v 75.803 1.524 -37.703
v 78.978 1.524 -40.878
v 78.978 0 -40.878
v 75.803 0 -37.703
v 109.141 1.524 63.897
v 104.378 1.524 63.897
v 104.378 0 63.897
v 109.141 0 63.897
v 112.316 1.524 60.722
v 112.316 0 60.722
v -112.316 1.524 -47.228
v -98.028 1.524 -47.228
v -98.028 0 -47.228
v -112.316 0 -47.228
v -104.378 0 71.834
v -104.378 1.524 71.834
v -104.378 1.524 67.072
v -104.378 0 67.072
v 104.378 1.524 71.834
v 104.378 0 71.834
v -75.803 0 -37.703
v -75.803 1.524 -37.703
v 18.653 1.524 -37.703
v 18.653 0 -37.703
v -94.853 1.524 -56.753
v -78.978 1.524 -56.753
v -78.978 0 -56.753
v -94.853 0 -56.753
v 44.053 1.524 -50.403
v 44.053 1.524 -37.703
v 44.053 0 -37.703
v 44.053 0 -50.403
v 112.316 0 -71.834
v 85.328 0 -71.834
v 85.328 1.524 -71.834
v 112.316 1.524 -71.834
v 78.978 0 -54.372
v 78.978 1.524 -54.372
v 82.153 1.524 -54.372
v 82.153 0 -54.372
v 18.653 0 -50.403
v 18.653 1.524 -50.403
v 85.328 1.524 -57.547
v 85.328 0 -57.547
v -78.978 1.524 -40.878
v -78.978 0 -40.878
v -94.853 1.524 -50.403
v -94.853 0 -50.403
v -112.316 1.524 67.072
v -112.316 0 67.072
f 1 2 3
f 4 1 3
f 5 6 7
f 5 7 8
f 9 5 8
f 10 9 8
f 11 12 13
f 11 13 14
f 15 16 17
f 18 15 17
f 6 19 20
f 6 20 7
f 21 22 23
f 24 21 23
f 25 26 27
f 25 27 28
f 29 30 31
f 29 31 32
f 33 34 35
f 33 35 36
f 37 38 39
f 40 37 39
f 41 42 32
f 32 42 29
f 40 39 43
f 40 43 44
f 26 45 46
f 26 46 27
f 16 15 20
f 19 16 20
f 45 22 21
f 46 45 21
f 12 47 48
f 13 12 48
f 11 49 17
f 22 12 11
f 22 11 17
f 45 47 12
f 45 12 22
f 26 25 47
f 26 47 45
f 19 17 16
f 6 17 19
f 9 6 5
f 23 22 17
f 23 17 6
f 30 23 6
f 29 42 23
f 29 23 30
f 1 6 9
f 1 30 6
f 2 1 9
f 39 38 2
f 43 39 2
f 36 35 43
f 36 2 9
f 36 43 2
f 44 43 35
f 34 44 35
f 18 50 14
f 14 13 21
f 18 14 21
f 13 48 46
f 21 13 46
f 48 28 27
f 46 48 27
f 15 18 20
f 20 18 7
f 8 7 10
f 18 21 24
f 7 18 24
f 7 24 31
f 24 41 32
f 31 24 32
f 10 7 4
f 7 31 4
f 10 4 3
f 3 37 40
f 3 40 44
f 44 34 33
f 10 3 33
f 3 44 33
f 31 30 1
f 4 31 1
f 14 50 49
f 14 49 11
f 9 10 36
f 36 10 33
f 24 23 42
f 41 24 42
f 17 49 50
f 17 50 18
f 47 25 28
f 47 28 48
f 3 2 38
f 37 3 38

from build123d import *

# Parameters (mm, degrees)
SKETCH1_W           = 224.63125
SKETCH1_H           = 143.66875
BOSS_EXTRUDE1_DEPTH = 1.524
CUT_EXTRUDE1_REACH  = 135.332
SKETCH2_W           = 157.95625
SKETCH2_H           = 34.13125
CHAMFER1_SIZE       = 3.175
SKETCH3_W           = 25.4
SKETCH3_H           = 12.7
BOSS_EXTRUDE2_DEPTH = 1.524
CUT_EXTRUDE2_REACH  = 135.332
CUT_EXTRUDE3_REACH  = 135.332
SKETCH5_W           = 6.35
SKETCH5_H           = 17.4625
CHAMFER2_SIZE       = 3.175
CUT_EXTRUDE4_REACH  = 135.332
SKETCH6_W           = 7.9375
SKETCH6_H           = 4.7625
SKETCH6_H_2         = 7.9375
CHAMFER3_SIZE       = 3.175


with BuildPart() as part:
    # Sketch1 → Boss-Extrude1 (new body)
    with BuildSketch(Plane(origin=(0, 0, 0), x_dir=(1, 0, 0), z_dir=(0, 1, 0))):
        Rectangle(SKETCH1_W, SKETCH1_H)
    extrude(amount=BOSS_EXTRUDE1_DEPTH)

    # Sketch2 → Cut-Extrude1 (cut, up to next)
    with BuildSketch(Plane(origin=(0, 1.524, 0), x_dir=(1, 0, 0), z_dir=(0, 1, 0)), mode=Mode.PRIVATE) as cut_extrude1_sk1:
        with Locations((0, 54.76875)):
            Rectangle(SKETCH2_W, SKETCH2_H)
    cut_extrude1_tool1 = extrude(cut_extrude1_sk1.sketch, amount=-CUT_EXTRUDE1_REACH, mode=Mode.PRIVATE) & part.part
    add(cut_extrude1_tool1.solids().sort_by_distance((0, 1.524, -54.76875))[0], mode=Mode.SUBTRACT)

    # Chamfer1
    chamfer1_edges = [part.edges().sort_by_distance(p)[0] for p in [
        (-78.978125, 0.762, -37.703125),
        (78.978125, 0.762, -37.703125),
    ]]
    chamfer(chamfer1_edges, length=CHAMFER1_SIZE)

    # Sketch3 → Boss-Extrude2 (add)
    with BuildSketch(Plane(origin=(0, 1.524, 0), x_dir=(1, 0, 0), z_dir=(0, 1, 0))):
        with Locations((31.353125, 44.053125)):
            Rectangle(SKETCH3_W, SKETCH3_H)
    extrude(amount=-BOSS_EXTRUDE2_DEPTH)

    # Sketch4 → Cut-Extrude2 (cut, up to next)
    with BuildSketch(Plane(origin=(0, 1.524, 0), x_dir=(1, 0, 0), z_dir=(0, 1, 0)), mode=Mode.PRIVATE) as cut_extrude2_sk1:
        Polygon((-78.978125, 56.753125), (-94.853125, 56.753125), (-94.853125, 47.228125), (-112.315625, 47.228125), (-112.315625, 71.834375), (-78.978125, 71.834375), align=None)
    cut_extrude2_tool1 = extrude(cut_extrude2_sk1.sketch, amount=-CUT_EXTRUDE2_REACH, mode=Mode.PRIVATE) & part.part
    add(cut_extrude2_tool1.solids().sort_by_distance((-97.620039, 1.524, -61.235346))[0], mode=Mode.SUBTRACT)

    # Sketch5 → Cut-Extrude3 (cut, up to next)
    with BuildSketch(Plane(origin=(0, 1.524, 0), x_dir=(1, 0, 0), z_dir=(0, 1, 0)), mode=Mode.PRIVATE) as cut_extrude3_sk1:
        with Locations((82.153125, 63.103125)):
            Rectangle(SKETCH5_W, SKETCH5_H)
    cut_extrude3_tool1 = extrude(cut_extrude3_sk1.sketch, amount=-CUT_EXTRUDE3_REACH, mode=Mode.PRIVATE) & part.part
    add(cut_extrude3_tool1.solids().sort_by_distance((82.153125, 1.524, -63.103125))[0], mode=Mode.SUBTRACT)

    # Chamfer2
    chamfer2_edges = [part.edges().sort_by_distance(p)[0] for p in [
        (-94.853125, 0.762, -47.228125),
        (85.328125, 0.762, -54.371875),
    ]]
    chamfer(chamfer2_edges, length=CHAMFER2_SIZE)

    # Sketch6 → Cut-Extrude4 (cut, up to next)
    with BuildSketch(Plane(origin=(0, 1.524, 0), x_dir=(1, 0, 0), z_dir=(0, 1, 0)), mode=Mode.PRIVATE) as cut_extrude4_sk1:
        with Locations((-108.346875, -69.453125)):
            Rectangle(SKETCH6_W, SKETCH6_H)
    cut_extrude4_tool1 = extrude(cut_extrude4_sk1.sketch, amount=-CUT_EXTRUDE4_REACH, mode=Mode.PRIVATE) & part.part
    # Sketch6 → Cut-Extrude4 (cut, up to next)
    with BuildSketch(Plane(origin=(0, 1.524, 0), x_dir=(1, 0, 0), z_dir=(0, 1, 0)), mode=Mode.PRIVATE) as cut_extrude4_sk2:
        with Locations((108.346875, -67.865625)):
            Rectangle(SKETCH6_W, SKETCH6_H_2)
    cut_extrude4_tool2 = extrude(cut_extrude4_sk2.sketch, amount=-CUT_EXTRUDE4_REACH, mode=Mode.PRIVATE) & part.part
    add(cut_extrude4_tool1.solids().sort_by_distance((-108.346875, 1.524, 69.453125))[0], mode=Mode.SUBTRACT)
    add(cut_extrude4_tool2.solids().sort_by_distance((108.346875, 1.524, 67.865625))[0], mode=Mode.SUBTRACT)

    # Chamfer3
    chamfer3_edges = [part.edges().sort_by_distance(p)[0] for p in [
        (112.315625, 0.762, 63.896875),
    ]]
    chamfer(chamfer3_edges, length=CHAMFER3_SIZE)


solid = part.part
